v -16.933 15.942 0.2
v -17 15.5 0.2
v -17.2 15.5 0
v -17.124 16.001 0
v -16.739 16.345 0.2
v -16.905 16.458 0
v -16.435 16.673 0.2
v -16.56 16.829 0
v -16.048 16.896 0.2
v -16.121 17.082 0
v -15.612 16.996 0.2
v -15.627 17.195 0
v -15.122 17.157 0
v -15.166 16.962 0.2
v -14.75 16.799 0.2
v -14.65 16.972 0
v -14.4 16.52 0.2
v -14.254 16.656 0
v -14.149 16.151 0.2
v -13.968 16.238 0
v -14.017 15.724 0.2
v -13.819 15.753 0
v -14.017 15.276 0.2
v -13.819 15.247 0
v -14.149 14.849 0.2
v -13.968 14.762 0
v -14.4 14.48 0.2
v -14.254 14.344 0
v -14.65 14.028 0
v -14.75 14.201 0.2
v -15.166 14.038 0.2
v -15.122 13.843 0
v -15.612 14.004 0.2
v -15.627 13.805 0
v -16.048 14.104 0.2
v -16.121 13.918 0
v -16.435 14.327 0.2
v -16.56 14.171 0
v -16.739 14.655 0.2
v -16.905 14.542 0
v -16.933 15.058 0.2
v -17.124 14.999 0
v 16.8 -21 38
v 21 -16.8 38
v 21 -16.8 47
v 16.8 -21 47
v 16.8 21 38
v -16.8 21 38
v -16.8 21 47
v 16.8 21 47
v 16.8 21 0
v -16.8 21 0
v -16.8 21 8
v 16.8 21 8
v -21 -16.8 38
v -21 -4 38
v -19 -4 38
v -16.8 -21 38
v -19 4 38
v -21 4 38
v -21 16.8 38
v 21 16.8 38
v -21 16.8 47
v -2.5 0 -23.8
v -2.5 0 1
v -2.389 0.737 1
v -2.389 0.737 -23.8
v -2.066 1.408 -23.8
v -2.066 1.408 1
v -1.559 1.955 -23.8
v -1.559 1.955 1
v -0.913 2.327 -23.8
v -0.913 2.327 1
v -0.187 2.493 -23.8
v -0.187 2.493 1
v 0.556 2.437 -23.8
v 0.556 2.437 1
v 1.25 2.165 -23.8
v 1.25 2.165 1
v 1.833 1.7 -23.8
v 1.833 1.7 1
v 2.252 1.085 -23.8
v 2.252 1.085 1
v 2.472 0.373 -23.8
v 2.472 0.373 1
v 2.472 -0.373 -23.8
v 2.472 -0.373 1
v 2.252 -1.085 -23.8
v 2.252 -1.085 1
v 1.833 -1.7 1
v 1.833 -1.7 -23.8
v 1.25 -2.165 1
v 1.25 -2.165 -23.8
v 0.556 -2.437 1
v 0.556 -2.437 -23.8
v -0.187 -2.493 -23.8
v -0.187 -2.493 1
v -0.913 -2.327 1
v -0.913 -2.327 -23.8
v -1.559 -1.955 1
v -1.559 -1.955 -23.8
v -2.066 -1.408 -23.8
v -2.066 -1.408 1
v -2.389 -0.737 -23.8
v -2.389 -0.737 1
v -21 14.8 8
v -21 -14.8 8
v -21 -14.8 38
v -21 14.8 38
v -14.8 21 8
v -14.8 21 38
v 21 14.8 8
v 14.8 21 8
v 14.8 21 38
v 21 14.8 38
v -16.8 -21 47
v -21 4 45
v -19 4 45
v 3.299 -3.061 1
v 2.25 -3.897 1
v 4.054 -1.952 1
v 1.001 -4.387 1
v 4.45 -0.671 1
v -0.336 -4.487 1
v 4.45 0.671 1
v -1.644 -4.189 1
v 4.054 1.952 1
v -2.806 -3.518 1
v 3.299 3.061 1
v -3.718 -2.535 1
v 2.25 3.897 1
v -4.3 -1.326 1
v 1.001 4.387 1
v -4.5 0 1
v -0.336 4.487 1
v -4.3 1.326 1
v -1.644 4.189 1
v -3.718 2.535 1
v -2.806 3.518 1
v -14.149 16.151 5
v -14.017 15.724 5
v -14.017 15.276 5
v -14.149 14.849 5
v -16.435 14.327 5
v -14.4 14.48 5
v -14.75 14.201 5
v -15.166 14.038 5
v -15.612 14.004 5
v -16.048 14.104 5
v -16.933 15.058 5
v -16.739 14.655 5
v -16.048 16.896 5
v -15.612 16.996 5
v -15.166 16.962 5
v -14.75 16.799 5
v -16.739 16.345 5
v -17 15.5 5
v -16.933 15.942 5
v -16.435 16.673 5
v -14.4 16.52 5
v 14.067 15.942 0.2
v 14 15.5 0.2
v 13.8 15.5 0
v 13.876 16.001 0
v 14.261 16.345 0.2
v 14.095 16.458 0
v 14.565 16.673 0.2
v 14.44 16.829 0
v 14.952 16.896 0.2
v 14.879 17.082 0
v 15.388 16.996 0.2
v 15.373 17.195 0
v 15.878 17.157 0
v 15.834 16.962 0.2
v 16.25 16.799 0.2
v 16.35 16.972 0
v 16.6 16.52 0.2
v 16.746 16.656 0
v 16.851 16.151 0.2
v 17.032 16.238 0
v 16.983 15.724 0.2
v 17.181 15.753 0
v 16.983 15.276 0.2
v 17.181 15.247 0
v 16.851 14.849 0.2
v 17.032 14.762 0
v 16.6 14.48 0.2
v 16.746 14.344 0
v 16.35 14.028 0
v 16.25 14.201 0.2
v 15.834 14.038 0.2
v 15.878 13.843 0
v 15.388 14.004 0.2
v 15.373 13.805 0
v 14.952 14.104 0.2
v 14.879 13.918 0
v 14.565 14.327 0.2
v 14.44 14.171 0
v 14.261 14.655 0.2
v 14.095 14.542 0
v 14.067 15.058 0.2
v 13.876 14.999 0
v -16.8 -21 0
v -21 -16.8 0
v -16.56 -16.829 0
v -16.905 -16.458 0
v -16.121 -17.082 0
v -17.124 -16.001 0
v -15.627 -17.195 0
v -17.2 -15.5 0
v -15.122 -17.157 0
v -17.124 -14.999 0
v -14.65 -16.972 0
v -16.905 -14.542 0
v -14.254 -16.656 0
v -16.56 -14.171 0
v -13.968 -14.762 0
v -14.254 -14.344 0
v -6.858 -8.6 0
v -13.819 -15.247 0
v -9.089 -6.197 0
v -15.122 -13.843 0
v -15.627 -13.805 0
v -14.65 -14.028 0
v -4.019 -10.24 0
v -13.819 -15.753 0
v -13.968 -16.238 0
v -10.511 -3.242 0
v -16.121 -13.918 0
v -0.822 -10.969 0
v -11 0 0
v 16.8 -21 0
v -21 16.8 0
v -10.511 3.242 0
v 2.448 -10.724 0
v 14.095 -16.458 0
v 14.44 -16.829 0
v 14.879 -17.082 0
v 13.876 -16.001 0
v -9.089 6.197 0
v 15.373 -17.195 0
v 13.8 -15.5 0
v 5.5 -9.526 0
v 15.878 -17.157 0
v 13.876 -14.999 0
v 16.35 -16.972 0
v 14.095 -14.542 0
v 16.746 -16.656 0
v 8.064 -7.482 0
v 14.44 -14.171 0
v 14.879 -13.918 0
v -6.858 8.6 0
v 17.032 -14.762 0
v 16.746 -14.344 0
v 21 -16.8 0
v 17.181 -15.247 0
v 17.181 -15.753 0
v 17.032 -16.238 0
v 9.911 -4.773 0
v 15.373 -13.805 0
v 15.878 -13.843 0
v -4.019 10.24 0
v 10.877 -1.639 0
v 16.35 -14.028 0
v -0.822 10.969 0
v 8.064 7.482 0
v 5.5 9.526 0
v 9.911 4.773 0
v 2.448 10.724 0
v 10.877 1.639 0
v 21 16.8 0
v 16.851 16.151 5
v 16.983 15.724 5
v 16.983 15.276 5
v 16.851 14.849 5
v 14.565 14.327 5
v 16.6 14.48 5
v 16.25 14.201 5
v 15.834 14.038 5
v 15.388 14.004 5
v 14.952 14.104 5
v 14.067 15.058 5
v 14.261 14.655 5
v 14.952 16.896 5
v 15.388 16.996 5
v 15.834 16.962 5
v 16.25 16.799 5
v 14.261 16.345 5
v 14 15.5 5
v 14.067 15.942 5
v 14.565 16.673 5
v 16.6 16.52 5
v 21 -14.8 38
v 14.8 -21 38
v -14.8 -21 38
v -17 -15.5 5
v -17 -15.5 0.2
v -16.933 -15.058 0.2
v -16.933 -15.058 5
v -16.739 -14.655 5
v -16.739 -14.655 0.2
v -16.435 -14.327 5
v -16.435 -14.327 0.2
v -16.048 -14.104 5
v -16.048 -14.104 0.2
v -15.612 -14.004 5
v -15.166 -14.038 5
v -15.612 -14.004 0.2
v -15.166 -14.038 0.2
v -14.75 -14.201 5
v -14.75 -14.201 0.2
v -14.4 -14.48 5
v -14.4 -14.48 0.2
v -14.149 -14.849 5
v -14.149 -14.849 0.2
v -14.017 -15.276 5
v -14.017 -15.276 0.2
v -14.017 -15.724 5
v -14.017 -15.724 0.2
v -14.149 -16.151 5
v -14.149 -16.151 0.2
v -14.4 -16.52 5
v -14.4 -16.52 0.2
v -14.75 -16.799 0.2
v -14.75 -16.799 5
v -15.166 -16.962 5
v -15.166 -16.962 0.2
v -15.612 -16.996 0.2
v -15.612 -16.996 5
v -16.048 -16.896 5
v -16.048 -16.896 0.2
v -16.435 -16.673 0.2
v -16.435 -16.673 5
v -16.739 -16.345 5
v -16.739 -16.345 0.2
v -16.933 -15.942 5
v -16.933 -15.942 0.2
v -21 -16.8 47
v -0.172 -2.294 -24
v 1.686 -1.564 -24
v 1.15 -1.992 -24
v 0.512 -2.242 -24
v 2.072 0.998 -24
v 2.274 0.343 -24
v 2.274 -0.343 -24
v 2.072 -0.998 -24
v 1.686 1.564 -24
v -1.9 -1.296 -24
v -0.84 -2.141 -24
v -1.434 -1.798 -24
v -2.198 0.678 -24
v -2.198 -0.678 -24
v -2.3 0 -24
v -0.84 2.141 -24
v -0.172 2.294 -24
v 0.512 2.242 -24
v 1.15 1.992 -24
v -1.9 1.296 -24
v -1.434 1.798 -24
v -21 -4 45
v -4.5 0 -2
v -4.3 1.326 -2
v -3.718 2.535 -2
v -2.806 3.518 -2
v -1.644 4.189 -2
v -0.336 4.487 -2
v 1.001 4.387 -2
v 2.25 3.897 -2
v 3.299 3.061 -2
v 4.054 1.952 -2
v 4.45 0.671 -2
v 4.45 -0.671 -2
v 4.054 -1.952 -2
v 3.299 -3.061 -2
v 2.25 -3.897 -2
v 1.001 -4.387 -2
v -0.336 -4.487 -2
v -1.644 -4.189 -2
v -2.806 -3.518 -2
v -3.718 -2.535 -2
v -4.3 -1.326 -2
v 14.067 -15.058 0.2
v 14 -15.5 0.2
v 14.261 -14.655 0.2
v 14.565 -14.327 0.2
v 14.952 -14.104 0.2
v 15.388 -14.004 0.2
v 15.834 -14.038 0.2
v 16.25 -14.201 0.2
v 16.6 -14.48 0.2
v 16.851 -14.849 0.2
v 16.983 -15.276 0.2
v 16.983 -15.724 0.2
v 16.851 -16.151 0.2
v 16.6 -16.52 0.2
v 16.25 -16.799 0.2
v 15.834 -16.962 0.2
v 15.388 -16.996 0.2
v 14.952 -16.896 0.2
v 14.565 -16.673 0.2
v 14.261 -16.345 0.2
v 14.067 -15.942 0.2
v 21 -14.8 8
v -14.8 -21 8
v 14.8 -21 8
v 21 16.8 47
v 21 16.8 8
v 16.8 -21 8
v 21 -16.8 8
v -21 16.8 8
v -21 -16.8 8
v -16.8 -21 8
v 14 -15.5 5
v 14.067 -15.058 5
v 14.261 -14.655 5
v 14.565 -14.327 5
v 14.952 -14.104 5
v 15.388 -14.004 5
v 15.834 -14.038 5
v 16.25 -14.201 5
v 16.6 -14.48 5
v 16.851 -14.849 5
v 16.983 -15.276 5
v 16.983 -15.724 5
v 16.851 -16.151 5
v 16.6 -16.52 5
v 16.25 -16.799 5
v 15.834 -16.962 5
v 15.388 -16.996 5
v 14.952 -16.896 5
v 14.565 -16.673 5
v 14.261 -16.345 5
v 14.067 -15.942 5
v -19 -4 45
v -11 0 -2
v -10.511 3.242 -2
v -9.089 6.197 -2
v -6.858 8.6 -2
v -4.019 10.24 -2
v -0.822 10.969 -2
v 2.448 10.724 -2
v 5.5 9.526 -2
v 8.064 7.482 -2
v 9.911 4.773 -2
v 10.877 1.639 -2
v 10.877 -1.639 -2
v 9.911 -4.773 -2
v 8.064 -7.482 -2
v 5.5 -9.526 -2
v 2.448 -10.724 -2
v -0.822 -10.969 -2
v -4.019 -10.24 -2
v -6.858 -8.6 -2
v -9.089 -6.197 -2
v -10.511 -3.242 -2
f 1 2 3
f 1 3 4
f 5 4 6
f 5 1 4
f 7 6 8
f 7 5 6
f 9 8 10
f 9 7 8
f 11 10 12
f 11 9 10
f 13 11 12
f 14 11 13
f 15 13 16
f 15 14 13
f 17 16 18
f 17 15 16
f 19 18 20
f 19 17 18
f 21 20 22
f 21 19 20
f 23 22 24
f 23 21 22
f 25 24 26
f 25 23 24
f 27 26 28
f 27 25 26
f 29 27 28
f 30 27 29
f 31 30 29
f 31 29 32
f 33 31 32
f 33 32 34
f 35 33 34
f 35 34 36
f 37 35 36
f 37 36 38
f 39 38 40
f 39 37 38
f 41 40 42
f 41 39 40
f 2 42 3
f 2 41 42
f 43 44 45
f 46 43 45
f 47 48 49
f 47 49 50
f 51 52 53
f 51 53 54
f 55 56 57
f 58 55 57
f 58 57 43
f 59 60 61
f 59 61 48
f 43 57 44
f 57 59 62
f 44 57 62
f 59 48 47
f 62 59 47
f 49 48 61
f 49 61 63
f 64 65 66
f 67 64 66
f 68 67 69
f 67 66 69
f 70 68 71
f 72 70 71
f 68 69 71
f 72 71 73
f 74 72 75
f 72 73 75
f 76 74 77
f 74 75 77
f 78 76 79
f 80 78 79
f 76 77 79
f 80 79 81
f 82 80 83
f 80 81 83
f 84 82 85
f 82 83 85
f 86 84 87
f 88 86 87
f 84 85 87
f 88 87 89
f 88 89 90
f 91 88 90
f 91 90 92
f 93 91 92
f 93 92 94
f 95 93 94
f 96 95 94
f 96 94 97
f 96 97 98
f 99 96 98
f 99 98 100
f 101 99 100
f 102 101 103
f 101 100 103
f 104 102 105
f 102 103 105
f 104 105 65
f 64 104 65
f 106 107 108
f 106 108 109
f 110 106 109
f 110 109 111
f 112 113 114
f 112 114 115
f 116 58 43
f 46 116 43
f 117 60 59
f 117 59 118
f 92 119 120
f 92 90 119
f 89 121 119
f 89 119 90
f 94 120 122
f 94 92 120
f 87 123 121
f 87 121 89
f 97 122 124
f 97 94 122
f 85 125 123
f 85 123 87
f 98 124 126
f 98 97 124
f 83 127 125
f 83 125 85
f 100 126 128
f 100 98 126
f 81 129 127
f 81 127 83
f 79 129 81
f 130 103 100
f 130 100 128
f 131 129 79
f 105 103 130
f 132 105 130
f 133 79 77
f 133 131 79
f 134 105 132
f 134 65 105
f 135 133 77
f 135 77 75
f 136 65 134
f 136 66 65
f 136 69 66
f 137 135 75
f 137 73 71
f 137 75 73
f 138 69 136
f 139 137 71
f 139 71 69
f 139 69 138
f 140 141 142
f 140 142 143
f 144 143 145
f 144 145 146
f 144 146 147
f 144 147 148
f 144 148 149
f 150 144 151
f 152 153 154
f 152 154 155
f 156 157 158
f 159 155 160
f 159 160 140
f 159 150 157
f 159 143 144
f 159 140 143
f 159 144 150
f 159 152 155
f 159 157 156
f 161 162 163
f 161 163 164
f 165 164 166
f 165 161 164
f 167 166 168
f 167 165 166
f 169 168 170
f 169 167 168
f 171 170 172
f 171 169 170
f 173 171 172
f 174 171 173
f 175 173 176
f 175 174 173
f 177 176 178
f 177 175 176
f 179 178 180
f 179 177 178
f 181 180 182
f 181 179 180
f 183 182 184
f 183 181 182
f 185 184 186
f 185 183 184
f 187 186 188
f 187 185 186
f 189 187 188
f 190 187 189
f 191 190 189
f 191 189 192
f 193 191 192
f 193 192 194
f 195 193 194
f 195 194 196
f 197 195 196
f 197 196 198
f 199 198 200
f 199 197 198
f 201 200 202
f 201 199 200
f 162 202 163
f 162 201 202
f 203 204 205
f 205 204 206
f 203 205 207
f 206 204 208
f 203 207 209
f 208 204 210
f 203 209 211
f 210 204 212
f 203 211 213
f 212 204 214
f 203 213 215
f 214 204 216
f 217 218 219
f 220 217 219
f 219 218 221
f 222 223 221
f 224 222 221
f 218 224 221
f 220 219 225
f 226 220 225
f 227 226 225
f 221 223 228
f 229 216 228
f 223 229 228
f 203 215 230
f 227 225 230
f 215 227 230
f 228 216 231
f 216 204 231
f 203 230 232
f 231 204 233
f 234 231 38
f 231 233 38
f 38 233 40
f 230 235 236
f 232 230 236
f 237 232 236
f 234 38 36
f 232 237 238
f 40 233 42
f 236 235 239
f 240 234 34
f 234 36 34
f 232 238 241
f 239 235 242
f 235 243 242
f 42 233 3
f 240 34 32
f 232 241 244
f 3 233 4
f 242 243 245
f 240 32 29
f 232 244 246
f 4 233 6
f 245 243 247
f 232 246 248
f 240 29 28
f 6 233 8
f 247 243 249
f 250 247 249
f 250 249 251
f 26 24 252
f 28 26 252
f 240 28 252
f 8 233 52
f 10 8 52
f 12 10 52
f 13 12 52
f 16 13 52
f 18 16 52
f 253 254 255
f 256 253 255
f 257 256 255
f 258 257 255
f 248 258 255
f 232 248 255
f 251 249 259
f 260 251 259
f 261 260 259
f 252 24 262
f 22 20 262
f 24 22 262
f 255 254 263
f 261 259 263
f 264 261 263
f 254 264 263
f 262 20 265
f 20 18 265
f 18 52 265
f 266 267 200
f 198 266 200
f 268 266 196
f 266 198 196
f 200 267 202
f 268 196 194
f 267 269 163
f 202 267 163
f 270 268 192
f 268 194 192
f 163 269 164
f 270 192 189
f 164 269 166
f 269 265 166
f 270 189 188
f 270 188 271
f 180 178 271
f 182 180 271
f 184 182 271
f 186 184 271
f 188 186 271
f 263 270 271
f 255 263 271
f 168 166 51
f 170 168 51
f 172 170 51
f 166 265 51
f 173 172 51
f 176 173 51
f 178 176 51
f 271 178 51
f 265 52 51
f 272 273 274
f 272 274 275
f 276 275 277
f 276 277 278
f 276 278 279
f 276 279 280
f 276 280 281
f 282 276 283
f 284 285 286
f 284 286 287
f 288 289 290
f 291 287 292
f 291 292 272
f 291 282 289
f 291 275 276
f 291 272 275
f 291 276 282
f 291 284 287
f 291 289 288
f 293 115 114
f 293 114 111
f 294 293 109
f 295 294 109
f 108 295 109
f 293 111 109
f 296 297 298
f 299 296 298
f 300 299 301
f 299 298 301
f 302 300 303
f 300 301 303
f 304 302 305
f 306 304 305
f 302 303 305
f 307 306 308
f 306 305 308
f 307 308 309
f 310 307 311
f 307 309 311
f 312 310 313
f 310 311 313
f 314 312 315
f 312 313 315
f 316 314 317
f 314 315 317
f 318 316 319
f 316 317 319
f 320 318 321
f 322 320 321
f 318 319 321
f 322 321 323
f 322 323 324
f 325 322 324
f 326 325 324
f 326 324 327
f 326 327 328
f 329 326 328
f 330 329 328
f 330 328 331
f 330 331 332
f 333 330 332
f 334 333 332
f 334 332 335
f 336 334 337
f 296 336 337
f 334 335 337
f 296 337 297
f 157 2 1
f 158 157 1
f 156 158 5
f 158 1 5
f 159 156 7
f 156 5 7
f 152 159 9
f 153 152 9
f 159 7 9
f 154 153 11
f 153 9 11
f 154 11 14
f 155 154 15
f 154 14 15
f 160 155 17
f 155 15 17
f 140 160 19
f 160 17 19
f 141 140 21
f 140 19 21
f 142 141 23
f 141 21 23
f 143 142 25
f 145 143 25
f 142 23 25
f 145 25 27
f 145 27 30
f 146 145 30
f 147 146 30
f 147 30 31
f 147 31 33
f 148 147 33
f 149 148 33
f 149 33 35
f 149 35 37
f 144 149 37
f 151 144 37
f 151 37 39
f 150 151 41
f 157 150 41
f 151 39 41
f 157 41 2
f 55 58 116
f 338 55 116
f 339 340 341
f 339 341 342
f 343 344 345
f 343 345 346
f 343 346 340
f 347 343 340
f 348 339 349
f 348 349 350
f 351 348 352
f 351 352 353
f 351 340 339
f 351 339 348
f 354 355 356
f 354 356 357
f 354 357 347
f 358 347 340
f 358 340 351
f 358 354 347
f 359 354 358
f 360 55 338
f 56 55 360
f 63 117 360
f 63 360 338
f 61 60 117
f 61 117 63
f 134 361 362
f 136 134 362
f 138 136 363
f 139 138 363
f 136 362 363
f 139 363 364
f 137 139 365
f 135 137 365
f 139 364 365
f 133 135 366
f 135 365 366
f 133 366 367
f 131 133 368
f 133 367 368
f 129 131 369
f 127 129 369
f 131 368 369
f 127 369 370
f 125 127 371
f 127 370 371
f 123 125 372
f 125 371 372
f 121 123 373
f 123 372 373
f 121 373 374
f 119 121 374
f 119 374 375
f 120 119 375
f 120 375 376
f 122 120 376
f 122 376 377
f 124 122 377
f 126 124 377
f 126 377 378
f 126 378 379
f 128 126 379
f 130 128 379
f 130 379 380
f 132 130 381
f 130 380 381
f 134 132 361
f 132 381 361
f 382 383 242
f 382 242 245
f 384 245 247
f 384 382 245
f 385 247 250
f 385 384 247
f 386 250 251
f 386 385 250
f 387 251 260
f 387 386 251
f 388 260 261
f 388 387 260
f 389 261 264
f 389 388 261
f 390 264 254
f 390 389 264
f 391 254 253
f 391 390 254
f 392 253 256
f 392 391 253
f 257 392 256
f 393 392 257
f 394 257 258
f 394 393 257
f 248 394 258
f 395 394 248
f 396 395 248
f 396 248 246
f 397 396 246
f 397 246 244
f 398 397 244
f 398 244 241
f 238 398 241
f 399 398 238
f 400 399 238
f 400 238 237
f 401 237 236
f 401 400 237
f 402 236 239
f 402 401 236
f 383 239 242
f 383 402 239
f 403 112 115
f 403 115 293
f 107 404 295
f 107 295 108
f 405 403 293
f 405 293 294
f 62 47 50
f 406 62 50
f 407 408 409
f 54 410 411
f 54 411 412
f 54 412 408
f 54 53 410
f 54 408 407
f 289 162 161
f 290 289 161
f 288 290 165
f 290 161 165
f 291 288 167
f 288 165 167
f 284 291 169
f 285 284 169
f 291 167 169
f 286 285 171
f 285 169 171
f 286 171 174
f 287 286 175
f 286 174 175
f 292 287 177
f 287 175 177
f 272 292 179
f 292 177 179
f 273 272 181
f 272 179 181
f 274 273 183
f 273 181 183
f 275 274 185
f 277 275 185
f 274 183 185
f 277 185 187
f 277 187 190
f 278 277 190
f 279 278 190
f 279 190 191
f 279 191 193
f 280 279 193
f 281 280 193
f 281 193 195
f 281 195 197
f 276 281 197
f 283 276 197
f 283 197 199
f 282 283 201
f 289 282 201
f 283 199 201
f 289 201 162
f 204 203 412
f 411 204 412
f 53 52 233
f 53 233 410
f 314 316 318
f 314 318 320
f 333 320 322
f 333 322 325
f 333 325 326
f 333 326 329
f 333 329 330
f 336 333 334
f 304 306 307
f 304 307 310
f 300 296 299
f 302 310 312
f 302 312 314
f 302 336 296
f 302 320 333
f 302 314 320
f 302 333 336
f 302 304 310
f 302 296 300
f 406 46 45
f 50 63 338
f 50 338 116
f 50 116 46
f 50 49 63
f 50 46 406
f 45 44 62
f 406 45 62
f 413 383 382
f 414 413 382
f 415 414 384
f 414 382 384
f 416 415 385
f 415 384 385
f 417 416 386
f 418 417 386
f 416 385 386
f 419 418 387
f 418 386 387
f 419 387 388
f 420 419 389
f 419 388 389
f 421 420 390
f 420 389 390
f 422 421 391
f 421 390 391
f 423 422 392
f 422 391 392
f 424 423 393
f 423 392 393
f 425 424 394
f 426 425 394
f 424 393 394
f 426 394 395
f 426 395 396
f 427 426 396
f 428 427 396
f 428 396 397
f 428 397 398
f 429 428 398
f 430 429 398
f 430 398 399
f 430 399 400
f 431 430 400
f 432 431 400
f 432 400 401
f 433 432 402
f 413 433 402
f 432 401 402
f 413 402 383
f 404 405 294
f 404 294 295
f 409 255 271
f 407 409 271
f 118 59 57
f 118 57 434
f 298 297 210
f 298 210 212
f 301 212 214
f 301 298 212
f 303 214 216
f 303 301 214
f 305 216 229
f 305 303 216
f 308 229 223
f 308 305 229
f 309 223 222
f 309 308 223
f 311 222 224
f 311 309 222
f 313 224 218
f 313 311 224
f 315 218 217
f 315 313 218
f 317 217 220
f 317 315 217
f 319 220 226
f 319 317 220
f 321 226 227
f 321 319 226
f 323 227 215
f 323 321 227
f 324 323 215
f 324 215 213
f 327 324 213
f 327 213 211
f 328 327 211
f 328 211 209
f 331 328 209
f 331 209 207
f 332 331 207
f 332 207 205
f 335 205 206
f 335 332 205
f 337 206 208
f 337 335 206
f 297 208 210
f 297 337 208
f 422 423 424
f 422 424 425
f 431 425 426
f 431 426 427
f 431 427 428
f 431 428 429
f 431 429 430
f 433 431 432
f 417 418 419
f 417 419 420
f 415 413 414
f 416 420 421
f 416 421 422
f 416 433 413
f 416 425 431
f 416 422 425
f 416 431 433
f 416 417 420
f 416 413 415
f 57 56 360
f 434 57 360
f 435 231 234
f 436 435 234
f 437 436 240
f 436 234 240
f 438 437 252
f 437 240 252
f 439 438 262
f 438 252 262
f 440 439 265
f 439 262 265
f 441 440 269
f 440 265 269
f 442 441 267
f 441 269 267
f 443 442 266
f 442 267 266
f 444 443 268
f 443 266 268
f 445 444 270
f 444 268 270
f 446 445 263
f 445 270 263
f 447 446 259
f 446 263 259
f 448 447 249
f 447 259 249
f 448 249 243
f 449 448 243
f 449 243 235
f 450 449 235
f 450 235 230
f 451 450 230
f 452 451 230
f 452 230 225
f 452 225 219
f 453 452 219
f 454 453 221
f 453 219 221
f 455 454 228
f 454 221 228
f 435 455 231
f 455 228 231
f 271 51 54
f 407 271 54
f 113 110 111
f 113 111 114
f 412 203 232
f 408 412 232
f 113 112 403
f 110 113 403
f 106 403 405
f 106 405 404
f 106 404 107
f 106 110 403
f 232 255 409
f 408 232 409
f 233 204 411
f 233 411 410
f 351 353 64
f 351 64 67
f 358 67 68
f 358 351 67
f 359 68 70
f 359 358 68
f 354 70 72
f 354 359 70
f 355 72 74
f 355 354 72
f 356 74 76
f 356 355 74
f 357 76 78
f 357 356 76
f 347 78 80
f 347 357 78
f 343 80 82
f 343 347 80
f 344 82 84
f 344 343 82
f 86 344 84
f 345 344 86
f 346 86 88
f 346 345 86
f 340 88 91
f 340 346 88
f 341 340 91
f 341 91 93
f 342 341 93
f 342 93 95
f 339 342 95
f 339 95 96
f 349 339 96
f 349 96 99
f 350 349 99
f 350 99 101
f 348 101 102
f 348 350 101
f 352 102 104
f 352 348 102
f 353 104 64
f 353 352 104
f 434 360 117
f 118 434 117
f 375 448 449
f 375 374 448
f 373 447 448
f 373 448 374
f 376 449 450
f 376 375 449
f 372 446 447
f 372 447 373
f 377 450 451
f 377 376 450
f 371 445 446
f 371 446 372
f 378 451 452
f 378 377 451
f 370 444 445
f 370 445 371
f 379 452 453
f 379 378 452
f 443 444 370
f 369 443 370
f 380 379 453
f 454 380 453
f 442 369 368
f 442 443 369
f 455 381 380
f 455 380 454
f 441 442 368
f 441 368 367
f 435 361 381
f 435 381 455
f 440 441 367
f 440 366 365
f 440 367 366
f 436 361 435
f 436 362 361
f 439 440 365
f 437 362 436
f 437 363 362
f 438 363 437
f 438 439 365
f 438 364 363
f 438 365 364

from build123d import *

# Parameters (mm, degrees)
ESQUISSE1_W             = 42
ESQUISSE1_H             = 42
BOSS_EXTRU_1_DEPTH      = 8
CHANFREIN1_SIZE         = 4.2
BOSS_EXTRU_2_DEPTH      = 30
ESQUISSE4_W             = 42
ESQUISSE4_H             = 42
BOSS_EXTRU_3_DEPTH      = 9
CHANFREIN3_SIZE         = 4.2
ESQUISSE5_R             = 11
BOSS_EXTRU_4_DEPTH      = 2
ESQUISSE6_R             = 4.5
ENL_V_MAT_EXTRU_1_DEPTH = 3
ESQUISSE7_R             = 2.5
BOSS_EXTRU_5_DEPTH      = 25
CHANFREIN4_SIZE         = 0.2
ESQUISSE8_R             = 1.5
ENL_V_MAT_EXTRU_2_DEPTH = 5
CHANFREIN5_SIZE         = 0.2
ESQUISSE9_W             = 7
ESQUISSE9_H             = 8
ENL_V_MAT_EXTRU_3_DEPTH = 2


with BuildPart() as part:
    # Esquisse1 → Boss.-Extru.1 (new body)
    with BuildSketch(Plane.XY):
        Rectangle(ESQUISSE1_W, ESQUISSE1_H)
    extrude(amount=BOSS_EXTRU_1_DEPTH)

    # Chanfrein1
    chanfrein1_edges = [part.edges().sort_by_distance(p)[0] for p in [
        (21, -21, 4),
        (-21, -21, 4),
        (-21, 21, 4),
        (21, 21, 4),
    ]]
    chamfer(chanfrein1_edges, length=CHANFREIN1_SIZE)

    # Esquisse5 → Boss.-Extru.4 (add)
    with BuildSketch(Plane(origin=(0, 0, 0), x_dir=(-1, 0, 0), z_dir=(0, 0, -1))):
        Circle(ESQUISSE5_R)
    extrude(amount=BOSS_EXTRU_4_DEPTH)

    # Esquisse6 → Enlèv. mat.-Extru.1 (cut)
    with BuildSketch(Plane(origin=(0, 0, -2), x_dir=(-1, 0, 0), z_dir=(0, 0, -1))):
        Circle(ESQUISSE6_R)
    extrude(amount=-ENL_V_MAT_EXTRU_1_DEPTH, mode=Mode.SUBTRACT)

    # Esquisse7 → Boss.-Extru.5 (add)
    with BuildSketch(Plane(origin=(0, 0, 1), x_dir=(-1, 0, 0), z_dir=(0, 0, -1))):
        Circle(ESQUISSE7_R)
    extrude(amount=BOSS_EXTRU_5_DEPTH)

    # Chanfrein4
    chanfrein4_edges = [part.edges().sort_by_distance(p)[0] for p in [
        (2.5, 0, -24),
    ]]
    chamfer(chanfrein4_edges, length=CHANFREIN4_SIZE)

    # Esquisse8 → Enlèv. mat.-Extru.2 (cut)
    with BuildSketch(Plane(origin=(0, 0, 0), x_dir=(-1, 0, 0), z_dir=(0, 0, -1))):
        with Locations((-15.5, 15.5)):
            Circle(ESQUISSE8_R)
        with Locations((15.5, 15.5)):
            Circle(ESQUISSE8_R)
        with Locations((15.5, -15.5)):
            Circle(ESQUISSE8_R)
        with Locations((-15.5, -15.5)):
            Circle(ESQUISSE8_R)
    extrude(amount=-ENL_V_MAT_EXTRU_2_DEPTH, mode=Mode.SUBTRACT)

    # Chanfrein5
    chanfrein5_edges = [part.edges().sort_by_distance(p)[0] for p in [
        (17, 15.5, 0),
        (-14, 15.5, 0),
        (-14, -15.5, 0),
        (17, -15.5, 0),
    ]]
    chamfer(chanfrein5_edges, length=CHANFREIN5_SIZE)


with BuildPart() as body_2:
    # Esquisse3 → Boss.-Extru.2 (new body)
    with BuildSketch(Plane.XY.offset(8)):
        Polygon((-21, 14.8), (-14.8, 21), (14.8, 21), (21, 14.8), (21, -14.8), (14.8, -21), (-14.8, -21), (-21, -14.8), align=None)
    extrude(amount=BOSS_EXTRU_2_DEPTH)


with BuildPart() as body_3:
    # Esquisse4 → Boss.-Extru.3 (new body)
    with BuildSketch(Plane.XY.offset(38)):
        Rectangle(ESQUISSE4_W, ESQUISSE4_H)
    extrude(amount=BOSS_EXTRU_3_DEPTH)

    # Chanfrein3
    chanfrein3_edges = [body_3.edges().sort_by_distance(p)[0] for p in [
        (21, -21, 42.5),
        (-21, -21, 42.5),
        (-21, 21, 42.5),
        (21, 21, 42.5),
    ]]
    chamfer(chanfrein3_edges, length=CHANFREIN3_SIZE)

    # Esquisse9 → Enlèv. mat.-Extru.3 (cut)
    with BuildSketch(Plane.ZY.offset(21)):
        with Locations((41.5, 0)):
            Rectangle(ESQUISSE9_W, ESQUISSE9_H)
    extrude(amount=-ENL_V_MAT_EXTRU_3_DEPTH, mode=Mode.SUBTRACT)


solid = Compound([part.part, body_2.part, body_3.part])
